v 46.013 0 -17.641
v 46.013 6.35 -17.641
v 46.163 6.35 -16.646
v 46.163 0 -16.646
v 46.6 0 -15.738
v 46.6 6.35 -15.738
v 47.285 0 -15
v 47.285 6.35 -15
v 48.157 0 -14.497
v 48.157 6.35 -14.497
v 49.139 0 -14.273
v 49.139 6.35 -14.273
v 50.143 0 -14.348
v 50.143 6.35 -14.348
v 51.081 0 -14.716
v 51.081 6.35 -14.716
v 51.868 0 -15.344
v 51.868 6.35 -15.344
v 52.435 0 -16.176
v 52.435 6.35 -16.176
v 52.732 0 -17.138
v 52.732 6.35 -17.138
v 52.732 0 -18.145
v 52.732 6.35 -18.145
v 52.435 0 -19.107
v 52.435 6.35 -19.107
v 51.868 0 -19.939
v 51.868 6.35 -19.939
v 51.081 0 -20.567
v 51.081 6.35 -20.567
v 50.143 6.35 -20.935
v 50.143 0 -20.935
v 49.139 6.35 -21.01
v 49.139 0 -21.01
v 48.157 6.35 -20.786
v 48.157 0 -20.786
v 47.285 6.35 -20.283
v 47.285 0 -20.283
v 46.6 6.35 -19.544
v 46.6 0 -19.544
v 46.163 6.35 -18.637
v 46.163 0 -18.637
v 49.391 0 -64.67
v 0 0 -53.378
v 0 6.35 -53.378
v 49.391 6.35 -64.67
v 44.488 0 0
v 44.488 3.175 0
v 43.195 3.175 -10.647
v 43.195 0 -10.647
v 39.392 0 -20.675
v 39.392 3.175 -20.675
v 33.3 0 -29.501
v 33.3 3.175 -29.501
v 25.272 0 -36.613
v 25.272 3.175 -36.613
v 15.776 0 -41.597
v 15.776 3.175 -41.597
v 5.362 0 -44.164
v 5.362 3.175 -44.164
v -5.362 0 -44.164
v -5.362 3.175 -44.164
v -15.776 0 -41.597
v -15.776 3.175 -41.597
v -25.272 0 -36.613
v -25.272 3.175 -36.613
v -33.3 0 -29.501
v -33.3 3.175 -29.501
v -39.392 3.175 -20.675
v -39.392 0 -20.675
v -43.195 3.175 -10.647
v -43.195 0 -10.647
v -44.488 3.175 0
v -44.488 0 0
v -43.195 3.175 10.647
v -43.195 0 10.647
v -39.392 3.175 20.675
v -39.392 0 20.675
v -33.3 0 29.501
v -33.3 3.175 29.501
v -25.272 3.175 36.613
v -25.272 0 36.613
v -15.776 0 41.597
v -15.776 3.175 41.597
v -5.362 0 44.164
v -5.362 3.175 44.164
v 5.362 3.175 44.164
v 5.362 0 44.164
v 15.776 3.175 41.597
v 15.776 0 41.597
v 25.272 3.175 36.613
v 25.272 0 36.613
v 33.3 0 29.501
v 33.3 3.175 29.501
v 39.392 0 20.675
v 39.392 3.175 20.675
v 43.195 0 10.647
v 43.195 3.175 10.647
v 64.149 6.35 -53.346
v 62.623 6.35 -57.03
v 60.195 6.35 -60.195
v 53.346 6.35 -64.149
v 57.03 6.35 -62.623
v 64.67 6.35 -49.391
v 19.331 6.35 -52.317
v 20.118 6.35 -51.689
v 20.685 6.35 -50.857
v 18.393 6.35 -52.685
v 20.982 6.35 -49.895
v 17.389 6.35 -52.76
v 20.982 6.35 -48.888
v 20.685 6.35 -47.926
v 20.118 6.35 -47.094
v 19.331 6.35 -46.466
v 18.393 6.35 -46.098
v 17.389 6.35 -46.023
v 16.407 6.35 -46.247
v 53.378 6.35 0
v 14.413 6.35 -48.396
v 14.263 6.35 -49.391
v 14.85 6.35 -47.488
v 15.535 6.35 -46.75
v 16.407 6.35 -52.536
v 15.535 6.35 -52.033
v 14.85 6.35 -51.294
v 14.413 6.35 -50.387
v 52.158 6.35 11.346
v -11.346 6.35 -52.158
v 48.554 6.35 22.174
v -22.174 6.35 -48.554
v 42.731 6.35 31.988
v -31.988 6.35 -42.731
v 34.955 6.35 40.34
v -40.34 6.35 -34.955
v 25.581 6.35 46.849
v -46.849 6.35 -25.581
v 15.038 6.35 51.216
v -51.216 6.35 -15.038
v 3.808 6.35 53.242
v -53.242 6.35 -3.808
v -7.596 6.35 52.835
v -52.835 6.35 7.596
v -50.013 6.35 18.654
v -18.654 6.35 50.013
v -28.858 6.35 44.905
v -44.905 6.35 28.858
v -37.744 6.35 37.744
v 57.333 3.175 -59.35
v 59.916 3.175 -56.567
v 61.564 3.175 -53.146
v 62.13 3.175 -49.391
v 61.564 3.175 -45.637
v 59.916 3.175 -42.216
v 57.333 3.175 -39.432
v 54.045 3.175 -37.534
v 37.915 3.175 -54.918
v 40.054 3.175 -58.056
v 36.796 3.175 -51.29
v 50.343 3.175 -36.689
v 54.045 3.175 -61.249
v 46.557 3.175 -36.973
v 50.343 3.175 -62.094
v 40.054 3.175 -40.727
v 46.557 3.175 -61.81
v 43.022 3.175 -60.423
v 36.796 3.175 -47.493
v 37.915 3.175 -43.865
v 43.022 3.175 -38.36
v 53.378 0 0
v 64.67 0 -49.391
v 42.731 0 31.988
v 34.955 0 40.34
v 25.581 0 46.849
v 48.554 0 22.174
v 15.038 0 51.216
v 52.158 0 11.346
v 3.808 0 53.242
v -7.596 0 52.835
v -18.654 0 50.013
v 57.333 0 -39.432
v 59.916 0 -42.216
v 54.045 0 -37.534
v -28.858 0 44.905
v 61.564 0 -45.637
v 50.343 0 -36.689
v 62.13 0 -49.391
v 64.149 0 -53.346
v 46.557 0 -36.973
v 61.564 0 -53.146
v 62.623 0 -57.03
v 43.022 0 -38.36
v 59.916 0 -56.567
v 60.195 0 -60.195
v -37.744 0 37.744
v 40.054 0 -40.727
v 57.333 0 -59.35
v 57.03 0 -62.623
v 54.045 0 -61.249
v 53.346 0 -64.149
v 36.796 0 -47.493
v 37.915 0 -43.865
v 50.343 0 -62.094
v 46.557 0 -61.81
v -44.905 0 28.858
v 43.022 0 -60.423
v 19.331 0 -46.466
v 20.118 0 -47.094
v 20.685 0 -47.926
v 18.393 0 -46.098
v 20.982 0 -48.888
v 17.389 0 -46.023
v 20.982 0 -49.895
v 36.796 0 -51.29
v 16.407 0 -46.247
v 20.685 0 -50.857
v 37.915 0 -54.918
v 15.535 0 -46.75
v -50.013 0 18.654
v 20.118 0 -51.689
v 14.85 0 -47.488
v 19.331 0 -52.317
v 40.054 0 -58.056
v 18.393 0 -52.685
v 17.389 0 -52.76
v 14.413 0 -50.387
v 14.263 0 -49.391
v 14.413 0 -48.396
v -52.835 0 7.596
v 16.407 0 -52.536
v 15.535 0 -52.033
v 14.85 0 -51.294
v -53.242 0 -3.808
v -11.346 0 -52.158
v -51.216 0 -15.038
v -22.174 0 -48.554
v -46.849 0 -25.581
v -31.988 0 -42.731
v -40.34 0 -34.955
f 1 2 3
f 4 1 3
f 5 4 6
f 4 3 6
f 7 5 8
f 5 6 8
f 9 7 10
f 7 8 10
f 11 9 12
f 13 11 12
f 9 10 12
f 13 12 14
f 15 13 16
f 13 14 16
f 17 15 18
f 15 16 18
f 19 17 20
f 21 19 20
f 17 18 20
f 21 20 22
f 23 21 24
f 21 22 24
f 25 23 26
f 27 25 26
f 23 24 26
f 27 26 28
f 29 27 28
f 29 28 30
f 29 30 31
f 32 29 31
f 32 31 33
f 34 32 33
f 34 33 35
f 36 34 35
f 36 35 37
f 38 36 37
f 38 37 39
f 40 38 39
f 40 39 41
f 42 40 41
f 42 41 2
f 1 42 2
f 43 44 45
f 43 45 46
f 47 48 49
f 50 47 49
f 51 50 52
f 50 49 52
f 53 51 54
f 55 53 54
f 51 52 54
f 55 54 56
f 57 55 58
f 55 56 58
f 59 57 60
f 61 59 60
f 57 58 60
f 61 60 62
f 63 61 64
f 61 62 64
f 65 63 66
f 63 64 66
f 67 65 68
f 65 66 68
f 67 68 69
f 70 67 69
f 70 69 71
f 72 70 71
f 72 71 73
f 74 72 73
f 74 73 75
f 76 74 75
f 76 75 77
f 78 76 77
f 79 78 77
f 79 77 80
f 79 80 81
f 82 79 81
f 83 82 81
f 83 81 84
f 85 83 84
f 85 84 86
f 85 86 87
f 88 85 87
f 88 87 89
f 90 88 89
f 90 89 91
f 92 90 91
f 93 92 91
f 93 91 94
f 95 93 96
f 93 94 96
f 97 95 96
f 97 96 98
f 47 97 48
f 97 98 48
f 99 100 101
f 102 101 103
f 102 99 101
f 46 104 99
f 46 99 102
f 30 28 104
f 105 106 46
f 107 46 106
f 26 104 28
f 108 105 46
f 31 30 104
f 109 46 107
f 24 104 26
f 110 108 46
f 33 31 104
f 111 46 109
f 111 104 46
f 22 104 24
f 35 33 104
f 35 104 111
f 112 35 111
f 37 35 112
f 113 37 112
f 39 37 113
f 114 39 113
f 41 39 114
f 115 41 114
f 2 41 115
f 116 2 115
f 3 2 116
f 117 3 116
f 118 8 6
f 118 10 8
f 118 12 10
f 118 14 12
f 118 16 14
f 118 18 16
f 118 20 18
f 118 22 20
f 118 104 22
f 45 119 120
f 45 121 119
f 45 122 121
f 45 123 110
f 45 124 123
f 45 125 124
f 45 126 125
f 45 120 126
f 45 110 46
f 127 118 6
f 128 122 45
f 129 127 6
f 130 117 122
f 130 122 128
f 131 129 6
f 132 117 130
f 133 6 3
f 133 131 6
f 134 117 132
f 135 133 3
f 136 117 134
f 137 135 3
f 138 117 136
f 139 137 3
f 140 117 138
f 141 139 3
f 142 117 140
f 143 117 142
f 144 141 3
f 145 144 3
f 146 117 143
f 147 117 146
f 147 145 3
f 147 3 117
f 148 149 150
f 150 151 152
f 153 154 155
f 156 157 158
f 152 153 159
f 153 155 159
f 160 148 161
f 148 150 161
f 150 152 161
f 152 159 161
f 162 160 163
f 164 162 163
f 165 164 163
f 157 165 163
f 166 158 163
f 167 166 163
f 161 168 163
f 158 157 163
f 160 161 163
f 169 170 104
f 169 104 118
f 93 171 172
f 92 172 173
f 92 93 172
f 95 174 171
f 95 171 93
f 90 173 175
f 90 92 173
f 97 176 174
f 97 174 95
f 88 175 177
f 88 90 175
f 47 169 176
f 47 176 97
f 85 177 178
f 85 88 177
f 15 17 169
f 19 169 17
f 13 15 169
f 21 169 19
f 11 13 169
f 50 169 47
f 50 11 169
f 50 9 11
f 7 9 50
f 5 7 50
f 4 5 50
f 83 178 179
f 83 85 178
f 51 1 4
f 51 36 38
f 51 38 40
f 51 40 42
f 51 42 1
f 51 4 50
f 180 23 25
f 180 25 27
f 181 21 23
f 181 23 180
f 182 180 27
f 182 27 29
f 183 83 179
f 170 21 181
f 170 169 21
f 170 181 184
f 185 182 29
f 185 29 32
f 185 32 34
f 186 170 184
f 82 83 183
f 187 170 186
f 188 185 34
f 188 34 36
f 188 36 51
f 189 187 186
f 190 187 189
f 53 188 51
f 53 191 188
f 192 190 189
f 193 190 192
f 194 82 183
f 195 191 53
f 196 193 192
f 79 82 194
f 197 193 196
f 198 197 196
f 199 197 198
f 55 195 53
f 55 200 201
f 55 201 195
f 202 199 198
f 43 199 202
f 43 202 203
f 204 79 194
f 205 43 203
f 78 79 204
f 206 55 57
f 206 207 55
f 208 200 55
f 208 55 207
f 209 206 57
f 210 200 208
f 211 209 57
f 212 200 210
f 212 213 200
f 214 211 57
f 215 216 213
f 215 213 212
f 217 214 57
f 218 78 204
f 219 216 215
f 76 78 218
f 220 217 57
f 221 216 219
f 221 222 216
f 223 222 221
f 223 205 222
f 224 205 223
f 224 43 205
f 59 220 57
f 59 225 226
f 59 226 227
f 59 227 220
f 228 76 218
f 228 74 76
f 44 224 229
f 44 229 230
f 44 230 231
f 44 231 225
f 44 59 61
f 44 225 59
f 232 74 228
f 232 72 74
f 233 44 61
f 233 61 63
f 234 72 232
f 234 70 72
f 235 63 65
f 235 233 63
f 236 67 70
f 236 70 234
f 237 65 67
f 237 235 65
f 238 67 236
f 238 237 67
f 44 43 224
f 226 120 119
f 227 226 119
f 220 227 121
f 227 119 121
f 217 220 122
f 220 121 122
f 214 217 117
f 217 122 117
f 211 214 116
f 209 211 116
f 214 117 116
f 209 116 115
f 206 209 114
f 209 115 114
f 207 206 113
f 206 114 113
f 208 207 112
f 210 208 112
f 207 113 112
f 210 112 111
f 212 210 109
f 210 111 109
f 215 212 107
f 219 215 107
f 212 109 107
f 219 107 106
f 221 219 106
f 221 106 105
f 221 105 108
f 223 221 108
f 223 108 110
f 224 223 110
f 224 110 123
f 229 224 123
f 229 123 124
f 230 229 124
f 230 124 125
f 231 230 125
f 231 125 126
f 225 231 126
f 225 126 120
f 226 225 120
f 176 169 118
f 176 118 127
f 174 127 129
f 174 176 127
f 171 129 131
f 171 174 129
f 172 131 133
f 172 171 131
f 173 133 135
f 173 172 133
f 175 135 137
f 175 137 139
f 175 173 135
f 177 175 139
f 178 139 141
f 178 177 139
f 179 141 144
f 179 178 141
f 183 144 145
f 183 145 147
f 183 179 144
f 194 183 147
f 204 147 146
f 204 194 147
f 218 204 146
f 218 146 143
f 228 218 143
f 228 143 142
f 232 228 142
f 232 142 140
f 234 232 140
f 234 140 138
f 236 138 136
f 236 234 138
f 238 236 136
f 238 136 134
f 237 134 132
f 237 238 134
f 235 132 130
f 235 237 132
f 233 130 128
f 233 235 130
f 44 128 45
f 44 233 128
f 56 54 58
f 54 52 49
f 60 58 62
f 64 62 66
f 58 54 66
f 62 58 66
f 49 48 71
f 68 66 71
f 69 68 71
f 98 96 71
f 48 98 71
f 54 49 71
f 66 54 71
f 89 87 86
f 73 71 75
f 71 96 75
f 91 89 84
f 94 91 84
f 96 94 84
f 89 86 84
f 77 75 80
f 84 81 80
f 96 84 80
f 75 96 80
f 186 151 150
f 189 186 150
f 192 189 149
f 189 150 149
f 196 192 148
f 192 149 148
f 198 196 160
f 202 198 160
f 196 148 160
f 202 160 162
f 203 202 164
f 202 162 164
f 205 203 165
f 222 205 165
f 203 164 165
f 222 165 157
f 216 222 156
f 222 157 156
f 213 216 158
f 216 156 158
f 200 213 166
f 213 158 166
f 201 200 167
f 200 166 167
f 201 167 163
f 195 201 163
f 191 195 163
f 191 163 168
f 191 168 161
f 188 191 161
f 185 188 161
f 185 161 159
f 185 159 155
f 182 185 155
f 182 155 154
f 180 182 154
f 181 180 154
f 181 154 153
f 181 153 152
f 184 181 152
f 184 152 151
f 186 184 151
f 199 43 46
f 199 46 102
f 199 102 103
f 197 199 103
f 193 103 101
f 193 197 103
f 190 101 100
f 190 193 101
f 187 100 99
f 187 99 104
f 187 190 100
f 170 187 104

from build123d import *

# Parameters (mm, degrees)
BOSS_EXTRUDE1_DEPTH         = 6.35
SKETCH3_R                   = 44.4881
SKETCH3_R_2                 = 12.7381
CUT_EXTRUDE1_DEPTH          = 7.35
F_1_4_CLEARANCE_HOLE1_D     = 6.7564
F_1_4_CLEARANCE_HOLE1_DEPTH = 25.4
F_1_4_CLEARANCE_HOLE1_TIP   = 2.029827343
SKETCH11_R                  = 44.4881
BOSS_EXTRUDE3_DEPTH         = 3.175
SKETCH12_R                  = 12.7381
BOSS_EXTRUDE4_DEPTH         = 3.175


with BuildPart() as part:
    # Sketch1 → Boss-Extrude1 (new body)
    with BuildSketch(Plane(origin=(0, 0, 0), x_dir=(1, 0, 0), z_dir=(0, 1, 0))):
        with BuildLine():
            Line((0, 53.3781), (49.391408666, 64.669508666))
            ThreePointArc((49.391408666, 64.669508666), (60.19465678, 60.19465678), (64.669508666, 49.391408666))
            Line((64.669508666, 49.391408666), (53.3781, 0))
            ThreePointArc((53.3781, 0), (-37.744016477, -37.744016477), (0, 53.3781))
        make_face()
    extrude(amount=BOSS_EXTRUDE1_DEPTH)

    # Sketch3 → Cut-Extrude1 (cut, through all)
    with BuildSketch(Plane(origin=(0, 6.35, 0), x_dir=(1, 0, 0), z_dir=(0, 1, 0))):
        Circle(SKETCH3_R)
        with Locations((49.391408666, 49.391408666)):
            Circle(SKETCH3_R_2)
    extrude(amount=-CUT_EXTRUDE1_DEPTH, mode=Mode.SUBTRACT)

    # 1/4 Clearance Hole1
    with Locations(Plane.XZ):
        with Locations((49.391408666, -17.641408666), (17.641408666, -49.391408666)):
            Hole(F_1_4_CLEARANCE_HOLE1_D / 2, depth=F_1_4_CLEARANCE_HOLE1_DEPTH)
            with Locations((0, 0, -(F_1_4_CLEARANCE_HOLE1_DEPTH + F_1_4_CLEARANCE_HOLE1_TIP / 2))):  # 118° drill point
                Cone(0, F_1_4_CLEARANCE_HOLE1_D / 2, F_1_4_CLEARANCE_HOLE1_TIP, mode=Mode.SUBTRACT)

    # Sketch11 → Boss-Extrude3 (add)
    with BuildSketch(Plane(origin=(0, 6.35, 0), x_dir=(-1, 0, 0), z_dir=(0, 1, 0))):
        Circle(SKETCH11_R)
    extrude(amount=-BOSS_EXTRUDE3_DEPTH)

    # Sketch12 → Boss-Extrude4 (add)
    with BuildSketch(Plane(origin=(0, 6.35, 0), x_dir=(-1, 0, 0), z_dir=(0, 1, 0))):
        with Locations((-49.391408666, -49.391408666)):
            Circle(SKETCH12_R)
    extrude(amount=-BOSS_EXTRUDE4_DEPTH)


solid = part.part
